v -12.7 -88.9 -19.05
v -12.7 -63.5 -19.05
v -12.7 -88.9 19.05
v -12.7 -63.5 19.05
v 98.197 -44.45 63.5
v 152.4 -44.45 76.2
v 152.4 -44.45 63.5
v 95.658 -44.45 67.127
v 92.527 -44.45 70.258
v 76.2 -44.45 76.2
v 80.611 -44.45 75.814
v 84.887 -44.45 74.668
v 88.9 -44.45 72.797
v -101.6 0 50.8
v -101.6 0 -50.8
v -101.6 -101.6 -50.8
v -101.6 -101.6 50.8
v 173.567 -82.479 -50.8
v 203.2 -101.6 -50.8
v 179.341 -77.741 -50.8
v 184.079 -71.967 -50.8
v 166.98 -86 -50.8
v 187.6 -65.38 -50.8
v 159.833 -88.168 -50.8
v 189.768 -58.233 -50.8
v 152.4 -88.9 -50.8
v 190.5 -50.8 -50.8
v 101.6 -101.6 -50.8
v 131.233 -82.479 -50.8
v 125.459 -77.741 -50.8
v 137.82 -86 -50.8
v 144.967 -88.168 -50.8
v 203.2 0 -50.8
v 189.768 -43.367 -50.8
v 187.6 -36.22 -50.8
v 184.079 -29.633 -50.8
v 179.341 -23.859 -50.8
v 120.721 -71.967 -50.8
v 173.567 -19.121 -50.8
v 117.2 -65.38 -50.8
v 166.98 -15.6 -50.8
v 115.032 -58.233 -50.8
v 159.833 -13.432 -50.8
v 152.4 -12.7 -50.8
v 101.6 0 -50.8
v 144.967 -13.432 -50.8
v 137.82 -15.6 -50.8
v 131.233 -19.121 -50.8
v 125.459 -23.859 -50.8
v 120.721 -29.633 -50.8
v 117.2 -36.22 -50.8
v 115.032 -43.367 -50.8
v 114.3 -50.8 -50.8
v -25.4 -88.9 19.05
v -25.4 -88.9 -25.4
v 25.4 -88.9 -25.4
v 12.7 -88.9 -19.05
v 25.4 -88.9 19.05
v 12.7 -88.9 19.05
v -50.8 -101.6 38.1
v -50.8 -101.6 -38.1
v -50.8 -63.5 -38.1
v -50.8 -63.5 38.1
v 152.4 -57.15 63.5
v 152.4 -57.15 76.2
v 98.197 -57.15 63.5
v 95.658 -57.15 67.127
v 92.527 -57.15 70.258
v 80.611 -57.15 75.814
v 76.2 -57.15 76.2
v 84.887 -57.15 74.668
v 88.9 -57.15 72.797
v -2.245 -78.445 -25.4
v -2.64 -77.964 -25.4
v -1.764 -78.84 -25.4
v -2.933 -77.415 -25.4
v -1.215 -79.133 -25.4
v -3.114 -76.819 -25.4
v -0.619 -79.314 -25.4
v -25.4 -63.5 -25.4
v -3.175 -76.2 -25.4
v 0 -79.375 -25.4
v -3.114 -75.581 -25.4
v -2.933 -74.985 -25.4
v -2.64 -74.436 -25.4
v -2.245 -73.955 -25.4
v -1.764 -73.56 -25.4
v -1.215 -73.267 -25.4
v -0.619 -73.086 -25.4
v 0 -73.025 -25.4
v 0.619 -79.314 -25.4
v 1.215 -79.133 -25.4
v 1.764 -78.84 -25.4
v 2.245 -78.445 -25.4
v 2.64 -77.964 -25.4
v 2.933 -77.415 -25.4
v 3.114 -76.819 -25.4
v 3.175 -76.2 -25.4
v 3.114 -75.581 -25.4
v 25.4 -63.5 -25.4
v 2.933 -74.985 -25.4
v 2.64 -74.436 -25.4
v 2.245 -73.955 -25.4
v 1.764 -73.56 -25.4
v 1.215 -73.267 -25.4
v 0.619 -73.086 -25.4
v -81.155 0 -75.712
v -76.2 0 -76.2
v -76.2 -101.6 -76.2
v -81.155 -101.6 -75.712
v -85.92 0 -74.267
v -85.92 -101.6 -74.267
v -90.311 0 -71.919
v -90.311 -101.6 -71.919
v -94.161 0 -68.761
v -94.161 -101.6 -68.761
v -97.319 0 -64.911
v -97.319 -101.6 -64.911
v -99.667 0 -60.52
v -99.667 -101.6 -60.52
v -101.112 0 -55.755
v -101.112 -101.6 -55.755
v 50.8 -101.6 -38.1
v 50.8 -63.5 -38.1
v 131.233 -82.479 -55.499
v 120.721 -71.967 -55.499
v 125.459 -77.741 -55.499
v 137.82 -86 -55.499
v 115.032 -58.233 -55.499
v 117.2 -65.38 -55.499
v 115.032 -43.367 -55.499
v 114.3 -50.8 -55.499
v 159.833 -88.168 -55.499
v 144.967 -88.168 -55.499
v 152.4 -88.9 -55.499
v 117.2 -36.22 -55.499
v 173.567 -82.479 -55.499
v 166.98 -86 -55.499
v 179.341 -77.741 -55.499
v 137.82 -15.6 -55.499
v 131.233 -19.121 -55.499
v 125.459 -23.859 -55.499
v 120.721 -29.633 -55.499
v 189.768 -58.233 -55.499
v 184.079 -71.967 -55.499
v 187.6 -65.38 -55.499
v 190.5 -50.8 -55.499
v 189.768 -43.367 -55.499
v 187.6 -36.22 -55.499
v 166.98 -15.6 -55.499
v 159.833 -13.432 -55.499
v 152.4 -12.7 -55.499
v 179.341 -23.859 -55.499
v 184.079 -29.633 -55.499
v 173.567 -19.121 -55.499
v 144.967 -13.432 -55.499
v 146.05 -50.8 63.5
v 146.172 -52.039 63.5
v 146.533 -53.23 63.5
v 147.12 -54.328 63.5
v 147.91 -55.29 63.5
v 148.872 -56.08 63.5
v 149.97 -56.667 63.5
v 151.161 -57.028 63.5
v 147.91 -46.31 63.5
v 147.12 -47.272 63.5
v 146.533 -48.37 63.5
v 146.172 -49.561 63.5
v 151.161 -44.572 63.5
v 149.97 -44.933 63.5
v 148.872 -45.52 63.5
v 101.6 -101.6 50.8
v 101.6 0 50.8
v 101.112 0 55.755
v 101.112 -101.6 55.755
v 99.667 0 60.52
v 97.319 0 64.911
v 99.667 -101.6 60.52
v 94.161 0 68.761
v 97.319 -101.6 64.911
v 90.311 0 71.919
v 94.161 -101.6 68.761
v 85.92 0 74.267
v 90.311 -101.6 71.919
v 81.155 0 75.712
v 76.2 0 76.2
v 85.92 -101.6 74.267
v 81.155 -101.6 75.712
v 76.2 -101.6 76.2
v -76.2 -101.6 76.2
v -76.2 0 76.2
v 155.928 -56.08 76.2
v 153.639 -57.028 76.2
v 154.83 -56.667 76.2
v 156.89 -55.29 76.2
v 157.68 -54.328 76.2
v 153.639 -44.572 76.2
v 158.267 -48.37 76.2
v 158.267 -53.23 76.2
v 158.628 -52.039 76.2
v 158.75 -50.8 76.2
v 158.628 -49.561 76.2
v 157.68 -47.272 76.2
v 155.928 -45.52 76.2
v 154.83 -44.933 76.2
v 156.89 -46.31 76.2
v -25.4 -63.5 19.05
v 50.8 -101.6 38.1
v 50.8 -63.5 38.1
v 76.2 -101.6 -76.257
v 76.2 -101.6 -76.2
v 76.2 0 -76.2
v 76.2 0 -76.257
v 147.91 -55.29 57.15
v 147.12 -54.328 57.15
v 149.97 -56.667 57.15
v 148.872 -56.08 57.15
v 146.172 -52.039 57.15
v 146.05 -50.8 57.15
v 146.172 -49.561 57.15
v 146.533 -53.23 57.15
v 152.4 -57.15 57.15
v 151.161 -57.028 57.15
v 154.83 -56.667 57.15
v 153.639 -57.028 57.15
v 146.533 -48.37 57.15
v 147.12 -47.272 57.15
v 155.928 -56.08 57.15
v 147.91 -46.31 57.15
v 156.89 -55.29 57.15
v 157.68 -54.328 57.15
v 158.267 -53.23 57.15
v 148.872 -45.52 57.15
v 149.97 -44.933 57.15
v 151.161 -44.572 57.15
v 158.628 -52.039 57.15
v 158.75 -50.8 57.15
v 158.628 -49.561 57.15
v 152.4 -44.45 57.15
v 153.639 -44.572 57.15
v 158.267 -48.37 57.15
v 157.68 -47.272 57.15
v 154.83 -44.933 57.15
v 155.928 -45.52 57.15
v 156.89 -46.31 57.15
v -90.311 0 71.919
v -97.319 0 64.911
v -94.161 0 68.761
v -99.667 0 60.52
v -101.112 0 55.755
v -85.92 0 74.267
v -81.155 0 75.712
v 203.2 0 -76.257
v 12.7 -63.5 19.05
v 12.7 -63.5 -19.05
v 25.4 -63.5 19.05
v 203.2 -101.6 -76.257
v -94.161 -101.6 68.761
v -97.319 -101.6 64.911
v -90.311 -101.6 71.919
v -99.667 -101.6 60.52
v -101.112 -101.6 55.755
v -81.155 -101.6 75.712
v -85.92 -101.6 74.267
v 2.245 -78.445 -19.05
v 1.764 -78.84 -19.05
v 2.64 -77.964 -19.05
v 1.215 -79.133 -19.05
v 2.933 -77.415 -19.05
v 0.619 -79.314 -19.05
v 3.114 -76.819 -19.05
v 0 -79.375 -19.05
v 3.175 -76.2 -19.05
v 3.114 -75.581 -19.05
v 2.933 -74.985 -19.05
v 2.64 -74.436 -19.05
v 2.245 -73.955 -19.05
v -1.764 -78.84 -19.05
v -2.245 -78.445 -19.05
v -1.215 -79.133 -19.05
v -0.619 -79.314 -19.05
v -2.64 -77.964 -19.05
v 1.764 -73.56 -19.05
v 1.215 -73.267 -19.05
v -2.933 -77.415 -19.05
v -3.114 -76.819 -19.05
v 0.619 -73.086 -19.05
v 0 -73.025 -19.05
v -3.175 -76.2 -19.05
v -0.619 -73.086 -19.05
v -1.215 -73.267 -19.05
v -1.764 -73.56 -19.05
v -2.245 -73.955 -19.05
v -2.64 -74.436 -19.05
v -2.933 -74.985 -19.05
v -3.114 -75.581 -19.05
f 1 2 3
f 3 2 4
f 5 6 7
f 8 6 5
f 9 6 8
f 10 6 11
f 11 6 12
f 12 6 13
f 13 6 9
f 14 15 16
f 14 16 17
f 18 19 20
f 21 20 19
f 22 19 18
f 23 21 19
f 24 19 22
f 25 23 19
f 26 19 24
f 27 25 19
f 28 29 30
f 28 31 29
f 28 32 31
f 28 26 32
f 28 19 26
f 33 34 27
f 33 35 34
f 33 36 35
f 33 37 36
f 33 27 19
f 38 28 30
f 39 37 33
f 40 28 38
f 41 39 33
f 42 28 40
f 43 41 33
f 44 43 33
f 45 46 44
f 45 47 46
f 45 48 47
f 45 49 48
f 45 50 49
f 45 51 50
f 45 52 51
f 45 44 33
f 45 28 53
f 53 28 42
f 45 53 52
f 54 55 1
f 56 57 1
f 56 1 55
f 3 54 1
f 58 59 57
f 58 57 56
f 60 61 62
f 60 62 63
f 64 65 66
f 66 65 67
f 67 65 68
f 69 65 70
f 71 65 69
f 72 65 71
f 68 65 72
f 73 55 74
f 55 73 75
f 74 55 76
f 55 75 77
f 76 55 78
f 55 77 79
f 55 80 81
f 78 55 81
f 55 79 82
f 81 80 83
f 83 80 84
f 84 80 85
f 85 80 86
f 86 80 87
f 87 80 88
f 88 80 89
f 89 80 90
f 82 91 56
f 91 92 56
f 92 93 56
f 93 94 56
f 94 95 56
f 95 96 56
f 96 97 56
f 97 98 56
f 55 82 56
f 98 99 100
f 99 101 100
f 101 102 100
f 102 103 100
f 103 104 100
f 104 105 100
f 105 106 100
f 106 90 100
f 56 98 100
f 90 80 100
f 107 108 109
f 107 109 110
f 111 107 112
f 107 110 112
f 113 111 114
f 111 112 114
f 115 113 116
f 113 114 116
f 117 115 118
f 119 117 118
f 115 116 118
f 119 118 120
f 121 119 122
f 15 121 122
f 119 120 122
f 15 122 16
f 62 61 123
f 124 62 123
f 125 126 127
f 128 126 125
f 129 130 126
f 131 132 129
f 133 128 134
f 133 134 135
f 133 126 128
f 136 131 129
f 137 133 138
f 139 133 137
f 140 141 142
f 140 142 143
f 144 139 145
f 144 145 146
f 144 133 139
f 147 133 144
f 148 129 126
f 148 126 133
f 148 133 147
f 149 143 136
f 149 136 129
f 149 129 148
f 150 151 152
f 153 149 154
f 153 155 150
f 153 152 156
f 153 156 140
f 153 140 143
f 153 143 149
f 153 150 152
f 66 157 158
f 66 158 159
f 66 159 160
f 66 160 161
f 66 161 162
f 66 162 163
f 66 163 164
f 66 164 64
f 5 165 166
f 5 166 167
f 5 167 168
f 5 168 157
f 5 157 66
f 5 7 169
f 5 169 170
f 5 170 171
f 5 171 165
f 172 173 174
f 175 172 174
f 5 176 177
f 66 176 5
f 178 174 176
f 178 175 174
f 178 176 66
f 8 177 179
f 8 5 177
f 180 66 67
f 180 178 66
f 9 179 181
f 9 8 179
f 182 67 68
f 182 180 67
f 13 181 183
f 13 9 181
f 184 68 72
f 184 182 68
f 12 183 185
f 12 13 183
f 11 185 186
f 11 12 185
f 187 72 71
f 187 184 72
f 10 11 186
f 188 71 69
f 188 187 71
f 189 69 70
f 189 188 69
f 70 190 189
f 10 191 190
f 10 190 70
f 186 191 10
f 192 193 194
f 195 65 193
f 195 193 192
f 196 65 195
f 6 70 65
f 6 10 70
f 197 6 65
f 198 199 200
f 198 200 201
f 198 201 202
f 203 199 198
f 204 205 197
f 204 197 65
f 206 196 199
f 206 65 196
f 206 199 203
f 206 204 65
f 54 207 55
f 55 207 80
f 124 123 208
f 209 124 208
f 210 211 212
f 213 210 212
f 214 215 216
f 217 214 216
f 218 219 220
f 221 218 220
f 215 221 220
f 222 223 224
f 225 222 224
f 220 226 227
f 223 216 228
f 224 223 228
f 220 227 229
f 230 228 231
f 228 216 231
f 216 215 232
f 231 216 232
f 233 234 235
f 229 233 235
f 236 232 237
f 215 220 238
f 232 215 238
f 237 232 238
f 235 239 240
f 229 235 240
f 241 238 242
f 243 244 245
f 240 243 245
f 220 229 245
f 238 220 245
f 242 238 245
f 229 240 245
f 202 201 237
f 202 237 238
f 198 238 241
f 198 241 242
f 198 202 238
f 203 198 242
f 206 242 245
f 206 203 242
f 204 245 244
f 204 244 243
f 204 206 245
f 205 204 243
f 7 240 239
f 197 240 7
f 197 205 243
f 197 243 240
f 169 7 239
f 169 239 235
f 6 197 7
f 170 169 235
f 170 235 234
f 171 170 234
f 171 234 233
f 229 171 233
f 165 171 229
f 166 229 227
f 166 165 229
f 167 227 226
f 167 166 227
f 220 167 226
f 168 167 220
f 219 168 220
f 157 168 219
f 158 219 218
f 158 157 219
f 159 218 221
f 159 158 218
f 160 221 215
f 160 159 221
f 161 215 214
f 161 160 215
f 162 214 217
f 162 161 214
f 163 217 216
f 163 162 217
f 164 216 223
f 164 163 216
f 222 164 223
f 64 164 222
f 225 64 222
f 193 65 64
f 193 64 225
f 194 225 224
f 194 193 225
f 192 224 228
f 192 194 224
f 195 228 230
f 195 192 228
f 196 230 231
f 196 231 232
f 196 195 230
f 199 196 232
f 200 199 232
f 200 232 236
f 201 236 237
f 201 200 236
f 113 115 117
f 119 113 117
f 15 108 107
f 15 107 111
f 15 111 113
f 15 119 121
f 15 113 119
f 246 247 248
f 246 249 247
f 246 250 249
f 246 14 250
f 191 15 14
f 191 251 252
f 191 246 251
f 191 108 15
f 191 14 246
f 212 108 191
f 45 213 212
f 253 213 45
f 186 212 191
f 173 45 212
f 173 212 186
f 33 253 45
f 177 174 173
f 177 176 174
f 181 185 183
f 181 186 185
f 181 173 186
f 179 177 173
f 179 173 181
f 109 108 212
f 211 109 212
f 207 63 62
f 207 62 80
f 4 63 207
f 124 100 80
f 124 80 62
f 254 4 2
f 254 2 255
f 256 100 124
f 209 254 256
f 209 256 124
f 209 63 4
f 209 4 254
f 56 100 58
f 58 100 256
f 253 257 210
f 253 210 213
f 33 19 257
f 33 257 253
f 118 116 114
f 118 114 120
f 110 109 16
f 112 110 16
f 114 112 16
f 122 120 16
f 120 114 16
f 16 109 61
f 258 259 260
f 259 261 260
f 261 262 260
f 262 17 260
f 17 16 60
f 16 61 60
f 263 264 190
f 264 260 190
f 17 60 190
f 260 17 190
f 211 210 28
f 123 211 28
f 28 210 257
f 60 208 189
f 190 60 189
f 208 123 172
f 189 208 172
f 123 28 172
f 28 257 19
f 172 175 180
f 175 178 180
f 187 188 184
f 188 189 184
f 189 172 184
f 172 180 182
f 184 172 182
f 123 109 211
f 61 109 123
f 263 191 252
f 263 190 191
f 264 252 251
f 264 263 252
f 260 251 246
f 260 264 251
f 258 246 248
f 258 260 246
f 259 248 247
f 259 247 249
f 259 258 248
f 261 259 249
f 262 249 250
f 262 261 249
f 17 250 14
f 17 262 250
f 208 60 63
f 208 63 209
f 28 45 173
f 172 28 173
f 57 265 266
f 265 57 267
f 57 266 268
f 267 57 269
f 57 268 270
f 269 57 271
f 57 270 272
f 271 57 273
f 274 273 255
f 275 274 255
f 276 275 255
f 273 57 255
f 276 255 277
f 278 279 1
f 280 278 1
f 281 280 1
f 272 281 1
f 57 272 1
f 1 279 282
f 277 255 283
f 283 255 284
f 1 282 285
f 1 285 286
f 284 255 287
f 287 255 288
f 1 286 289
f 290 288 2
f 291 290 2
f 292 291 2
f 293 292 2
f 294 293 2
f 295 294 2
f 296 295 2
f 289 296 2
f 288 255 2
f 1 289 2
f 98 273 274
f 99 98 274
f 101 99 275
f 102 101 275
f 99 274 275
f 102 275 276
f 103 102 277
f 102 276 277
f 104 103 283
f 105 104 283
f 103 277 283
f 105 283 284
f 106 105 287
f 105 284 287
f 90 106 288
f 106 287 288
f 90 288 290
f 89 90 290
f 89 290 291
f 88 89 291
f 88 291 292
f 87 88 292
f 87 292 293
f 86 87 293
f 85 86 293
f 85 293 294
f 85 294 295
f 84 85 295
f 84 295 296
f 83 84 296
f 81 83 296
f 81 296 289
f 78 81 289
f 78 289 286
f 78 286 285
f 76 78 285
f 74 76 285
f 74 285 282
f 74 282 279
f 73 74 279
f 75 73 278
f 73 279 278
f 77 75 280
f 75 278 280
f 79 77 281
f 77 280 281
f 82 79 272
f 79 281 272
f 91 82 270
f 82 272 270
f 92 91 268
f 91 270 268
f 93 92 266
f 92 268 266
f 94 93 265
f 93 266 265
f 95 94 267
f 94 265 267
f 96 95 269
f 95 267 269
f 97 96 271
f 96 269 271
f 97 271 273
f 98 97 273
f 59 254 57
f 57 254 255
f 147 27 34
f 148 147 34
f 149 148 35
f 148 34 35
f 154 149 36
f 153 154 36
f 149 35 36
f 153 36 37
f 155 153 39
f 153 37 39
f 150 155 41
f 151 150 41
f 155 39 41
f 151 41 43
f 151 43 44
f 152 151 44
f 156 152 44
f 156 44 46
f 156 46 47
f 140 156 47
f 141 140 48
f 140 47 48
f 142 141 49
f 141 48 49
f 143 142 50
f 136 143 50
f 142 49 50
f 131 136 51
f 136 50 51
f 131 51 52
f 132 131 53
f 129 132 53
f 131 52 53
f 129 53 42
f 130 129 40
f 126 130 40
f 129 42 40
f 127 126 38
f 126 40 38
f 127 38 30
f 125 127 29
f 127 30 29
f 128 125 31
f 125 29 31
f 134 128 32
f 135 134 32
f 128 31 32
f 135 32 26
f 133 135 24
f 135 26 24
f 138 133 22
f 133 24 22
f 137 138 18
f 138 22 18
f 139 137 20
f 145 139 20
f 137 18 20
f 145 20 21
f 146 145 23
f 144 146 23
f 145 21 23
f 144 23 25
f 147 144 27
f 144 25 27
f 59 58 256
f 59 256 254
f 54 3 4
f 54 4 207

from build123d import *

# Parameters (mm, degrees)
F0_W           = 203.2
F0_H           = 152.4
F1_DEPTH       = 101.6
F2_R           = 25.4
F3_R           = 25.4
F4_W           = 101.6
F4_H           = 76.2
F5_DEPTH       = 38.1
F7_DEPTH       = 25.4
F8_R           = 3.175
F9_DEPTH       = 12.7
F10_W          = 101.6
F10_H          = 25.457462908
F11_DEPTH      = 101.6
F11_DEPTH_BACK = 25.4
F12_R          = 38.1
F13_DEPTH      = 4.699
F15_W          = 152.4
F15_H          = 12.7
F16_DEPTH      = 6.35
F16_DEPTH_BACK = 6.35
F17_R          = 6.35
F18_DEPTH      = 19.05


with BuildPart() as f1:
    # F0 (on Front) → F1 (new body)
    with BuildSketch(Plane.XZ):
        Rectangle(F0_W, F0_H)
    extrude(amount=F1_DEPTH)

    # F2
    f2_edges = [f1.edges().sort_by_distance(p)[0] for p in [
        (101.6, -50.8, 76.2),
    ]]
    fillet(f2_edges, radius=F2_R)

    # F3
    f3_edges = [f1.edges().sort_by_distance(p)[0] for p in [
        (-101.6, -50.8, 76.2),
        (101.6, -50.8, -76.2),
        (-101.6, -50.8, -76.2),
    ]]
    fillet(f3_edges, radius=F3_R)

    # F4 (on face) → F5 (cut)
    with BuildSketch(Plane.XZ.offset(101.6)):
        Rectangle(F4_W, F4_H)
    extrude(amount=-F5_DEPTH, mode=Mode.SUBTRACT)

    # F6 (on face) → F7 (join)
    with BuildSketch(Plane.XZ.offset(63.5)):
        Polygon((-12.7, 19.05), (-25.4, 19.05), (-25.4, -19.05), (-25.4, -25.4), (25.4, -25.4), (25.4, -19.05), (25.4, 19.05), (12.7, 19.05), (12.7, -19.05), (-12.7, -19.05), align=None)
    extrude(amount=F7_DEPTH)

    # F8 (on face) → F9 (cut)
    with BuildSketch(Plane.XY.offset(-19.05)):
        with Locations((0, -76.2)):
            Circle(F8_R)
    extrude(amount=-F9_DEPTH, mode=Mode.SUBTRACT)

    # F10 (on face) → F11 (join, two sides)
    with BuildSketch(Plane.YZ.offset(101.6)) as f11_sk:
        with Locations((-50.8, -63.528731454)):
            Rectangle(F10_W, F10_H)
    extrude(amount=F11_DEPTH)
    extrude(f11_sk.sketch, amount=-F11_DEPTH_BACK)

    # F12 (on face) → F13 (cut)
    with BuildSketch(Plane.XY.offset(-50.8)):
        with Locations((152.4, -50.8)):
            Circle(F12_R)
    extrude(amount=-F13_DEPTH, mode=Mode.SUBTRACT)

    # F15 (on offset) → F16 (join, two sides)
    with BuildSketch(Plane(origin=(0, -50.8, 0), x_dir=(-1, 0, 0), z_dir=(0, 1, 0))) as f16_sk:
        with Locations((-76.2, 69.85)):
            Rectangle(F15_W, F15_H)
    extrude(amount=F16_DEPTH)
    extrude(f16_sk.sketch, amount=-F16_DEPTH_BACK)

    # F17 (on face) → F18 (join)
    with BuildSketch(Plane.XY.offset(76.2)):
        with Locations((152.4, -50.8)):
            Circle(F17_R)
    extrude(amount=-F18_DEPTH)


solid = f1.part
